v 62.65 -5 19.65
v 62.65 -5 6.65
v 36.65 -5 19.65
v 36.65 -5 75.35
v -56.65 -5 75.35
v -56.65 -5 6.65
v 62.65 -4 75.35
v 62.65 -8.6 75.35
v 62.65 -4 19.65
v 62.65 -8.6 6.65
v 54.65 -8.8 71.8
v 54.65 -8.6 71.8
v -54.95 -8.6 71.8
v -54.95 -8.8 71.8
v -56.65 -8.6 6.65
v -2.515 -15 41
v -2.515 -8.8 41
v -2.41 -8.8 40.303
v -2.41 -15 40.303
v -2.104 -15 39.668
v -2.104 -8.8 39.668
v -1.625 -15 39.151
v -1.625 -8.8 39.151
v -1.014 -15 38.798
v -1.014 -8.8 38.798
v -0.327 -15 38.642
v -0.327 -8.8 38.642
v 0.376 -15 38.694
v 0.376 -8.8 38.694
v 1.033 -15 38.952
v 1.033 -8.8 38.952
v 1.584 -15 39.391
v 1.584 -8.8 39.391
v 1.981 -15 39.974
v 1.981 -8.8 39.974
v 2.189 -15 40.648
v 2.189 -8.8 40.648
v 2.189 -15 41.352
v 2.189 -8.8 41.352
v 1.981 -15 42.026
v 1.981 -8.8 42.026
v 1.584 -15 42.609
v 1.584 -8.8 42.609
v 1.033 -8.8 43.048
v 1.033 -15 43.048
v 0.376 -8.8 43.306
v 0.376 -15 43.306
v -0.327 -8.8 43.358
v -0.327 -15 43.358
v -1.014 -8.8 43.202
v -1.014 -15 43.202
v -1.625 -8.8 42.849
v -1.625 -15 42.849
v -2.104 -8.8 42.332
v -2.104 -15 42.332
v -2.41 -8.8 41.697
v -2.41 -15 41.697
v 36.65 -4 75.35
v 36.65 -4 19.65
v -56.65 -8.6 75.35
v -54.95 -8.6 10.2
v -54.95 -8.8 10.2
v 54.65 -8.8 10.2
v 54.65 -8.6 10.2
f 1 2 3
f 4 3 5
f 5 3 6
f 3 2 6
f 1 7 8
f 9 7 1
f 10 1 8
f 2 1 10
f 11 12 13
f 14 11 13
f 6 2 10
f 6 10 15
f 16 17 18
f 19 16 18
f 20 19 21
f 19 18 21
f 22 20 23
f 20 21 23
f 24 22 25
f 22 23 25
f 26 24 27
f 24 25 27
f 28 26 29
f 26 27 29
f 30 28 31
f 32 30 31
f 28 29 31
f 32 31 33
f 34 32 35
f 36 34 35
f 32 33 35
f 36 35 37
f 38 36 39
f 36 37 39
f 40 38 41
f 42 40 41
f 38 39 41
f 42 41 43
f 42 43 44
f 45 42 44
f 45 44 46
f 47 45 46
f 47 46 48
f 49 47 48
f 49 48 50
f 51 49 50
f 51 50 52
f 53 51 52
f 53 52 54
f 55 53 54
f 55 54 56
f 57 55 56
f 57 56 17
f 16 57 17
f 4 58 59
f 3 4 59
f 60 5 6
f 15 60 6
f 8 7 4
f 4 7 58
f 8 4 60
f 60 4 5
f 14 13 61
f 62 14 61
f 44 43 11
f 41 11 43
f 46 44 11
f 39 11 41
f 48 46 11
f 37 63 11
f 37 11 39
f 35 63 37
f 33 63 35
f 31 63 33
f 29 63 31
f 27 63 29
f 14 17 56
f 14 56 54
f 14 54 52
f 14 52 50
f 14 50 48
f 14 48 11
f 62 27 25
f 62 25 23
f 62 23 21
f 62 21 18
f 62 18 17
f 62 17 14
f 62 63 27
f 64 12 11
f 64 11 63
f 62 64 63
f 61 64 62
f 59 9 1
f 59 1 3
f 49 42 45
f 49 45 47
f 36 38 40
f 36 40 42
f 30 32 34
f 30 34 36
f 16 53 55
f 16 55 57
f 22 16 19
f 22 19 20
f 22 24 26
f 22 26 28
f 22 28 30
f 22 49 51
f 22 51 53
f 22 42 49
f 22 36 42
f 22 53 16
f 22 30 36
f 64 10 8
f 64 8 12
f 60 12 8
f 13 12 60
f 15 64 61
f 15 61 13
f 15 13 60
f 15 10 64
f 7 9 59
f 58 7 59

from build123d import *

# Parameters (mm, degrees)
SKETCH002_W             = 119.3
SKETCH002_H             = 68.7
PAD001_DEPTH            = 3.6
SKETCH003_W             = 109.6
SKETCH003_H             = 61.6
PAD002_DEPTH            = 0.3
SKETCH004_W             = 26
SKETCH004_H             = 55.7
PAD003_DEPTH            = 1
SKETCH006_R             = 2.365045
PAD004_DEPTH            = 10
BODY001_PLACEMENT_ANGLE = 180


with BuildPart() as part:
    # Sketch002 → Pad001 (new body)
    with BuildSketch(Plane.XZ):
        Rectangle(SKETCH002_W, SKETCH002_H)
    extrude(amount=PAD001_DEPTH)

    # Sketch003 → Pad002 (join)
    with BuildSketch(Plane.XZ.offset(3.5)):
        with Locations((3.15, 0)):
            Rectangle(SKETCH003_W, SKETCH003_H)
    extrude(amount=PAD002_DEPTH)

    # Sketch004 → Pad003 (join)
    with BuildSketch(Plane.XZ.offset(-1)):
        with Locations((-46.65, -6.5)):
            Rectangle(SKETCH004_W, SKETCH004_H)
    extrude(amount=PAD003_DEPTH)

    # Sketch006 → Pad004 (join)
    with BuildSketch(Plane.XZ):
        with Locations((3.15, 0)):
            Circle(SKETCH006_R)
    extrude(amount=PAD004_DEPTH)


with BuildPart() as part_1:
    # Body001 placement: moved
    add(part.part.moved(Location((3, -5, 41))).rotate(Axis((3, -5, 41), (0, 1, 0)), BODY001_PLACEMENT_ANGLE))


solid = part_1.part
